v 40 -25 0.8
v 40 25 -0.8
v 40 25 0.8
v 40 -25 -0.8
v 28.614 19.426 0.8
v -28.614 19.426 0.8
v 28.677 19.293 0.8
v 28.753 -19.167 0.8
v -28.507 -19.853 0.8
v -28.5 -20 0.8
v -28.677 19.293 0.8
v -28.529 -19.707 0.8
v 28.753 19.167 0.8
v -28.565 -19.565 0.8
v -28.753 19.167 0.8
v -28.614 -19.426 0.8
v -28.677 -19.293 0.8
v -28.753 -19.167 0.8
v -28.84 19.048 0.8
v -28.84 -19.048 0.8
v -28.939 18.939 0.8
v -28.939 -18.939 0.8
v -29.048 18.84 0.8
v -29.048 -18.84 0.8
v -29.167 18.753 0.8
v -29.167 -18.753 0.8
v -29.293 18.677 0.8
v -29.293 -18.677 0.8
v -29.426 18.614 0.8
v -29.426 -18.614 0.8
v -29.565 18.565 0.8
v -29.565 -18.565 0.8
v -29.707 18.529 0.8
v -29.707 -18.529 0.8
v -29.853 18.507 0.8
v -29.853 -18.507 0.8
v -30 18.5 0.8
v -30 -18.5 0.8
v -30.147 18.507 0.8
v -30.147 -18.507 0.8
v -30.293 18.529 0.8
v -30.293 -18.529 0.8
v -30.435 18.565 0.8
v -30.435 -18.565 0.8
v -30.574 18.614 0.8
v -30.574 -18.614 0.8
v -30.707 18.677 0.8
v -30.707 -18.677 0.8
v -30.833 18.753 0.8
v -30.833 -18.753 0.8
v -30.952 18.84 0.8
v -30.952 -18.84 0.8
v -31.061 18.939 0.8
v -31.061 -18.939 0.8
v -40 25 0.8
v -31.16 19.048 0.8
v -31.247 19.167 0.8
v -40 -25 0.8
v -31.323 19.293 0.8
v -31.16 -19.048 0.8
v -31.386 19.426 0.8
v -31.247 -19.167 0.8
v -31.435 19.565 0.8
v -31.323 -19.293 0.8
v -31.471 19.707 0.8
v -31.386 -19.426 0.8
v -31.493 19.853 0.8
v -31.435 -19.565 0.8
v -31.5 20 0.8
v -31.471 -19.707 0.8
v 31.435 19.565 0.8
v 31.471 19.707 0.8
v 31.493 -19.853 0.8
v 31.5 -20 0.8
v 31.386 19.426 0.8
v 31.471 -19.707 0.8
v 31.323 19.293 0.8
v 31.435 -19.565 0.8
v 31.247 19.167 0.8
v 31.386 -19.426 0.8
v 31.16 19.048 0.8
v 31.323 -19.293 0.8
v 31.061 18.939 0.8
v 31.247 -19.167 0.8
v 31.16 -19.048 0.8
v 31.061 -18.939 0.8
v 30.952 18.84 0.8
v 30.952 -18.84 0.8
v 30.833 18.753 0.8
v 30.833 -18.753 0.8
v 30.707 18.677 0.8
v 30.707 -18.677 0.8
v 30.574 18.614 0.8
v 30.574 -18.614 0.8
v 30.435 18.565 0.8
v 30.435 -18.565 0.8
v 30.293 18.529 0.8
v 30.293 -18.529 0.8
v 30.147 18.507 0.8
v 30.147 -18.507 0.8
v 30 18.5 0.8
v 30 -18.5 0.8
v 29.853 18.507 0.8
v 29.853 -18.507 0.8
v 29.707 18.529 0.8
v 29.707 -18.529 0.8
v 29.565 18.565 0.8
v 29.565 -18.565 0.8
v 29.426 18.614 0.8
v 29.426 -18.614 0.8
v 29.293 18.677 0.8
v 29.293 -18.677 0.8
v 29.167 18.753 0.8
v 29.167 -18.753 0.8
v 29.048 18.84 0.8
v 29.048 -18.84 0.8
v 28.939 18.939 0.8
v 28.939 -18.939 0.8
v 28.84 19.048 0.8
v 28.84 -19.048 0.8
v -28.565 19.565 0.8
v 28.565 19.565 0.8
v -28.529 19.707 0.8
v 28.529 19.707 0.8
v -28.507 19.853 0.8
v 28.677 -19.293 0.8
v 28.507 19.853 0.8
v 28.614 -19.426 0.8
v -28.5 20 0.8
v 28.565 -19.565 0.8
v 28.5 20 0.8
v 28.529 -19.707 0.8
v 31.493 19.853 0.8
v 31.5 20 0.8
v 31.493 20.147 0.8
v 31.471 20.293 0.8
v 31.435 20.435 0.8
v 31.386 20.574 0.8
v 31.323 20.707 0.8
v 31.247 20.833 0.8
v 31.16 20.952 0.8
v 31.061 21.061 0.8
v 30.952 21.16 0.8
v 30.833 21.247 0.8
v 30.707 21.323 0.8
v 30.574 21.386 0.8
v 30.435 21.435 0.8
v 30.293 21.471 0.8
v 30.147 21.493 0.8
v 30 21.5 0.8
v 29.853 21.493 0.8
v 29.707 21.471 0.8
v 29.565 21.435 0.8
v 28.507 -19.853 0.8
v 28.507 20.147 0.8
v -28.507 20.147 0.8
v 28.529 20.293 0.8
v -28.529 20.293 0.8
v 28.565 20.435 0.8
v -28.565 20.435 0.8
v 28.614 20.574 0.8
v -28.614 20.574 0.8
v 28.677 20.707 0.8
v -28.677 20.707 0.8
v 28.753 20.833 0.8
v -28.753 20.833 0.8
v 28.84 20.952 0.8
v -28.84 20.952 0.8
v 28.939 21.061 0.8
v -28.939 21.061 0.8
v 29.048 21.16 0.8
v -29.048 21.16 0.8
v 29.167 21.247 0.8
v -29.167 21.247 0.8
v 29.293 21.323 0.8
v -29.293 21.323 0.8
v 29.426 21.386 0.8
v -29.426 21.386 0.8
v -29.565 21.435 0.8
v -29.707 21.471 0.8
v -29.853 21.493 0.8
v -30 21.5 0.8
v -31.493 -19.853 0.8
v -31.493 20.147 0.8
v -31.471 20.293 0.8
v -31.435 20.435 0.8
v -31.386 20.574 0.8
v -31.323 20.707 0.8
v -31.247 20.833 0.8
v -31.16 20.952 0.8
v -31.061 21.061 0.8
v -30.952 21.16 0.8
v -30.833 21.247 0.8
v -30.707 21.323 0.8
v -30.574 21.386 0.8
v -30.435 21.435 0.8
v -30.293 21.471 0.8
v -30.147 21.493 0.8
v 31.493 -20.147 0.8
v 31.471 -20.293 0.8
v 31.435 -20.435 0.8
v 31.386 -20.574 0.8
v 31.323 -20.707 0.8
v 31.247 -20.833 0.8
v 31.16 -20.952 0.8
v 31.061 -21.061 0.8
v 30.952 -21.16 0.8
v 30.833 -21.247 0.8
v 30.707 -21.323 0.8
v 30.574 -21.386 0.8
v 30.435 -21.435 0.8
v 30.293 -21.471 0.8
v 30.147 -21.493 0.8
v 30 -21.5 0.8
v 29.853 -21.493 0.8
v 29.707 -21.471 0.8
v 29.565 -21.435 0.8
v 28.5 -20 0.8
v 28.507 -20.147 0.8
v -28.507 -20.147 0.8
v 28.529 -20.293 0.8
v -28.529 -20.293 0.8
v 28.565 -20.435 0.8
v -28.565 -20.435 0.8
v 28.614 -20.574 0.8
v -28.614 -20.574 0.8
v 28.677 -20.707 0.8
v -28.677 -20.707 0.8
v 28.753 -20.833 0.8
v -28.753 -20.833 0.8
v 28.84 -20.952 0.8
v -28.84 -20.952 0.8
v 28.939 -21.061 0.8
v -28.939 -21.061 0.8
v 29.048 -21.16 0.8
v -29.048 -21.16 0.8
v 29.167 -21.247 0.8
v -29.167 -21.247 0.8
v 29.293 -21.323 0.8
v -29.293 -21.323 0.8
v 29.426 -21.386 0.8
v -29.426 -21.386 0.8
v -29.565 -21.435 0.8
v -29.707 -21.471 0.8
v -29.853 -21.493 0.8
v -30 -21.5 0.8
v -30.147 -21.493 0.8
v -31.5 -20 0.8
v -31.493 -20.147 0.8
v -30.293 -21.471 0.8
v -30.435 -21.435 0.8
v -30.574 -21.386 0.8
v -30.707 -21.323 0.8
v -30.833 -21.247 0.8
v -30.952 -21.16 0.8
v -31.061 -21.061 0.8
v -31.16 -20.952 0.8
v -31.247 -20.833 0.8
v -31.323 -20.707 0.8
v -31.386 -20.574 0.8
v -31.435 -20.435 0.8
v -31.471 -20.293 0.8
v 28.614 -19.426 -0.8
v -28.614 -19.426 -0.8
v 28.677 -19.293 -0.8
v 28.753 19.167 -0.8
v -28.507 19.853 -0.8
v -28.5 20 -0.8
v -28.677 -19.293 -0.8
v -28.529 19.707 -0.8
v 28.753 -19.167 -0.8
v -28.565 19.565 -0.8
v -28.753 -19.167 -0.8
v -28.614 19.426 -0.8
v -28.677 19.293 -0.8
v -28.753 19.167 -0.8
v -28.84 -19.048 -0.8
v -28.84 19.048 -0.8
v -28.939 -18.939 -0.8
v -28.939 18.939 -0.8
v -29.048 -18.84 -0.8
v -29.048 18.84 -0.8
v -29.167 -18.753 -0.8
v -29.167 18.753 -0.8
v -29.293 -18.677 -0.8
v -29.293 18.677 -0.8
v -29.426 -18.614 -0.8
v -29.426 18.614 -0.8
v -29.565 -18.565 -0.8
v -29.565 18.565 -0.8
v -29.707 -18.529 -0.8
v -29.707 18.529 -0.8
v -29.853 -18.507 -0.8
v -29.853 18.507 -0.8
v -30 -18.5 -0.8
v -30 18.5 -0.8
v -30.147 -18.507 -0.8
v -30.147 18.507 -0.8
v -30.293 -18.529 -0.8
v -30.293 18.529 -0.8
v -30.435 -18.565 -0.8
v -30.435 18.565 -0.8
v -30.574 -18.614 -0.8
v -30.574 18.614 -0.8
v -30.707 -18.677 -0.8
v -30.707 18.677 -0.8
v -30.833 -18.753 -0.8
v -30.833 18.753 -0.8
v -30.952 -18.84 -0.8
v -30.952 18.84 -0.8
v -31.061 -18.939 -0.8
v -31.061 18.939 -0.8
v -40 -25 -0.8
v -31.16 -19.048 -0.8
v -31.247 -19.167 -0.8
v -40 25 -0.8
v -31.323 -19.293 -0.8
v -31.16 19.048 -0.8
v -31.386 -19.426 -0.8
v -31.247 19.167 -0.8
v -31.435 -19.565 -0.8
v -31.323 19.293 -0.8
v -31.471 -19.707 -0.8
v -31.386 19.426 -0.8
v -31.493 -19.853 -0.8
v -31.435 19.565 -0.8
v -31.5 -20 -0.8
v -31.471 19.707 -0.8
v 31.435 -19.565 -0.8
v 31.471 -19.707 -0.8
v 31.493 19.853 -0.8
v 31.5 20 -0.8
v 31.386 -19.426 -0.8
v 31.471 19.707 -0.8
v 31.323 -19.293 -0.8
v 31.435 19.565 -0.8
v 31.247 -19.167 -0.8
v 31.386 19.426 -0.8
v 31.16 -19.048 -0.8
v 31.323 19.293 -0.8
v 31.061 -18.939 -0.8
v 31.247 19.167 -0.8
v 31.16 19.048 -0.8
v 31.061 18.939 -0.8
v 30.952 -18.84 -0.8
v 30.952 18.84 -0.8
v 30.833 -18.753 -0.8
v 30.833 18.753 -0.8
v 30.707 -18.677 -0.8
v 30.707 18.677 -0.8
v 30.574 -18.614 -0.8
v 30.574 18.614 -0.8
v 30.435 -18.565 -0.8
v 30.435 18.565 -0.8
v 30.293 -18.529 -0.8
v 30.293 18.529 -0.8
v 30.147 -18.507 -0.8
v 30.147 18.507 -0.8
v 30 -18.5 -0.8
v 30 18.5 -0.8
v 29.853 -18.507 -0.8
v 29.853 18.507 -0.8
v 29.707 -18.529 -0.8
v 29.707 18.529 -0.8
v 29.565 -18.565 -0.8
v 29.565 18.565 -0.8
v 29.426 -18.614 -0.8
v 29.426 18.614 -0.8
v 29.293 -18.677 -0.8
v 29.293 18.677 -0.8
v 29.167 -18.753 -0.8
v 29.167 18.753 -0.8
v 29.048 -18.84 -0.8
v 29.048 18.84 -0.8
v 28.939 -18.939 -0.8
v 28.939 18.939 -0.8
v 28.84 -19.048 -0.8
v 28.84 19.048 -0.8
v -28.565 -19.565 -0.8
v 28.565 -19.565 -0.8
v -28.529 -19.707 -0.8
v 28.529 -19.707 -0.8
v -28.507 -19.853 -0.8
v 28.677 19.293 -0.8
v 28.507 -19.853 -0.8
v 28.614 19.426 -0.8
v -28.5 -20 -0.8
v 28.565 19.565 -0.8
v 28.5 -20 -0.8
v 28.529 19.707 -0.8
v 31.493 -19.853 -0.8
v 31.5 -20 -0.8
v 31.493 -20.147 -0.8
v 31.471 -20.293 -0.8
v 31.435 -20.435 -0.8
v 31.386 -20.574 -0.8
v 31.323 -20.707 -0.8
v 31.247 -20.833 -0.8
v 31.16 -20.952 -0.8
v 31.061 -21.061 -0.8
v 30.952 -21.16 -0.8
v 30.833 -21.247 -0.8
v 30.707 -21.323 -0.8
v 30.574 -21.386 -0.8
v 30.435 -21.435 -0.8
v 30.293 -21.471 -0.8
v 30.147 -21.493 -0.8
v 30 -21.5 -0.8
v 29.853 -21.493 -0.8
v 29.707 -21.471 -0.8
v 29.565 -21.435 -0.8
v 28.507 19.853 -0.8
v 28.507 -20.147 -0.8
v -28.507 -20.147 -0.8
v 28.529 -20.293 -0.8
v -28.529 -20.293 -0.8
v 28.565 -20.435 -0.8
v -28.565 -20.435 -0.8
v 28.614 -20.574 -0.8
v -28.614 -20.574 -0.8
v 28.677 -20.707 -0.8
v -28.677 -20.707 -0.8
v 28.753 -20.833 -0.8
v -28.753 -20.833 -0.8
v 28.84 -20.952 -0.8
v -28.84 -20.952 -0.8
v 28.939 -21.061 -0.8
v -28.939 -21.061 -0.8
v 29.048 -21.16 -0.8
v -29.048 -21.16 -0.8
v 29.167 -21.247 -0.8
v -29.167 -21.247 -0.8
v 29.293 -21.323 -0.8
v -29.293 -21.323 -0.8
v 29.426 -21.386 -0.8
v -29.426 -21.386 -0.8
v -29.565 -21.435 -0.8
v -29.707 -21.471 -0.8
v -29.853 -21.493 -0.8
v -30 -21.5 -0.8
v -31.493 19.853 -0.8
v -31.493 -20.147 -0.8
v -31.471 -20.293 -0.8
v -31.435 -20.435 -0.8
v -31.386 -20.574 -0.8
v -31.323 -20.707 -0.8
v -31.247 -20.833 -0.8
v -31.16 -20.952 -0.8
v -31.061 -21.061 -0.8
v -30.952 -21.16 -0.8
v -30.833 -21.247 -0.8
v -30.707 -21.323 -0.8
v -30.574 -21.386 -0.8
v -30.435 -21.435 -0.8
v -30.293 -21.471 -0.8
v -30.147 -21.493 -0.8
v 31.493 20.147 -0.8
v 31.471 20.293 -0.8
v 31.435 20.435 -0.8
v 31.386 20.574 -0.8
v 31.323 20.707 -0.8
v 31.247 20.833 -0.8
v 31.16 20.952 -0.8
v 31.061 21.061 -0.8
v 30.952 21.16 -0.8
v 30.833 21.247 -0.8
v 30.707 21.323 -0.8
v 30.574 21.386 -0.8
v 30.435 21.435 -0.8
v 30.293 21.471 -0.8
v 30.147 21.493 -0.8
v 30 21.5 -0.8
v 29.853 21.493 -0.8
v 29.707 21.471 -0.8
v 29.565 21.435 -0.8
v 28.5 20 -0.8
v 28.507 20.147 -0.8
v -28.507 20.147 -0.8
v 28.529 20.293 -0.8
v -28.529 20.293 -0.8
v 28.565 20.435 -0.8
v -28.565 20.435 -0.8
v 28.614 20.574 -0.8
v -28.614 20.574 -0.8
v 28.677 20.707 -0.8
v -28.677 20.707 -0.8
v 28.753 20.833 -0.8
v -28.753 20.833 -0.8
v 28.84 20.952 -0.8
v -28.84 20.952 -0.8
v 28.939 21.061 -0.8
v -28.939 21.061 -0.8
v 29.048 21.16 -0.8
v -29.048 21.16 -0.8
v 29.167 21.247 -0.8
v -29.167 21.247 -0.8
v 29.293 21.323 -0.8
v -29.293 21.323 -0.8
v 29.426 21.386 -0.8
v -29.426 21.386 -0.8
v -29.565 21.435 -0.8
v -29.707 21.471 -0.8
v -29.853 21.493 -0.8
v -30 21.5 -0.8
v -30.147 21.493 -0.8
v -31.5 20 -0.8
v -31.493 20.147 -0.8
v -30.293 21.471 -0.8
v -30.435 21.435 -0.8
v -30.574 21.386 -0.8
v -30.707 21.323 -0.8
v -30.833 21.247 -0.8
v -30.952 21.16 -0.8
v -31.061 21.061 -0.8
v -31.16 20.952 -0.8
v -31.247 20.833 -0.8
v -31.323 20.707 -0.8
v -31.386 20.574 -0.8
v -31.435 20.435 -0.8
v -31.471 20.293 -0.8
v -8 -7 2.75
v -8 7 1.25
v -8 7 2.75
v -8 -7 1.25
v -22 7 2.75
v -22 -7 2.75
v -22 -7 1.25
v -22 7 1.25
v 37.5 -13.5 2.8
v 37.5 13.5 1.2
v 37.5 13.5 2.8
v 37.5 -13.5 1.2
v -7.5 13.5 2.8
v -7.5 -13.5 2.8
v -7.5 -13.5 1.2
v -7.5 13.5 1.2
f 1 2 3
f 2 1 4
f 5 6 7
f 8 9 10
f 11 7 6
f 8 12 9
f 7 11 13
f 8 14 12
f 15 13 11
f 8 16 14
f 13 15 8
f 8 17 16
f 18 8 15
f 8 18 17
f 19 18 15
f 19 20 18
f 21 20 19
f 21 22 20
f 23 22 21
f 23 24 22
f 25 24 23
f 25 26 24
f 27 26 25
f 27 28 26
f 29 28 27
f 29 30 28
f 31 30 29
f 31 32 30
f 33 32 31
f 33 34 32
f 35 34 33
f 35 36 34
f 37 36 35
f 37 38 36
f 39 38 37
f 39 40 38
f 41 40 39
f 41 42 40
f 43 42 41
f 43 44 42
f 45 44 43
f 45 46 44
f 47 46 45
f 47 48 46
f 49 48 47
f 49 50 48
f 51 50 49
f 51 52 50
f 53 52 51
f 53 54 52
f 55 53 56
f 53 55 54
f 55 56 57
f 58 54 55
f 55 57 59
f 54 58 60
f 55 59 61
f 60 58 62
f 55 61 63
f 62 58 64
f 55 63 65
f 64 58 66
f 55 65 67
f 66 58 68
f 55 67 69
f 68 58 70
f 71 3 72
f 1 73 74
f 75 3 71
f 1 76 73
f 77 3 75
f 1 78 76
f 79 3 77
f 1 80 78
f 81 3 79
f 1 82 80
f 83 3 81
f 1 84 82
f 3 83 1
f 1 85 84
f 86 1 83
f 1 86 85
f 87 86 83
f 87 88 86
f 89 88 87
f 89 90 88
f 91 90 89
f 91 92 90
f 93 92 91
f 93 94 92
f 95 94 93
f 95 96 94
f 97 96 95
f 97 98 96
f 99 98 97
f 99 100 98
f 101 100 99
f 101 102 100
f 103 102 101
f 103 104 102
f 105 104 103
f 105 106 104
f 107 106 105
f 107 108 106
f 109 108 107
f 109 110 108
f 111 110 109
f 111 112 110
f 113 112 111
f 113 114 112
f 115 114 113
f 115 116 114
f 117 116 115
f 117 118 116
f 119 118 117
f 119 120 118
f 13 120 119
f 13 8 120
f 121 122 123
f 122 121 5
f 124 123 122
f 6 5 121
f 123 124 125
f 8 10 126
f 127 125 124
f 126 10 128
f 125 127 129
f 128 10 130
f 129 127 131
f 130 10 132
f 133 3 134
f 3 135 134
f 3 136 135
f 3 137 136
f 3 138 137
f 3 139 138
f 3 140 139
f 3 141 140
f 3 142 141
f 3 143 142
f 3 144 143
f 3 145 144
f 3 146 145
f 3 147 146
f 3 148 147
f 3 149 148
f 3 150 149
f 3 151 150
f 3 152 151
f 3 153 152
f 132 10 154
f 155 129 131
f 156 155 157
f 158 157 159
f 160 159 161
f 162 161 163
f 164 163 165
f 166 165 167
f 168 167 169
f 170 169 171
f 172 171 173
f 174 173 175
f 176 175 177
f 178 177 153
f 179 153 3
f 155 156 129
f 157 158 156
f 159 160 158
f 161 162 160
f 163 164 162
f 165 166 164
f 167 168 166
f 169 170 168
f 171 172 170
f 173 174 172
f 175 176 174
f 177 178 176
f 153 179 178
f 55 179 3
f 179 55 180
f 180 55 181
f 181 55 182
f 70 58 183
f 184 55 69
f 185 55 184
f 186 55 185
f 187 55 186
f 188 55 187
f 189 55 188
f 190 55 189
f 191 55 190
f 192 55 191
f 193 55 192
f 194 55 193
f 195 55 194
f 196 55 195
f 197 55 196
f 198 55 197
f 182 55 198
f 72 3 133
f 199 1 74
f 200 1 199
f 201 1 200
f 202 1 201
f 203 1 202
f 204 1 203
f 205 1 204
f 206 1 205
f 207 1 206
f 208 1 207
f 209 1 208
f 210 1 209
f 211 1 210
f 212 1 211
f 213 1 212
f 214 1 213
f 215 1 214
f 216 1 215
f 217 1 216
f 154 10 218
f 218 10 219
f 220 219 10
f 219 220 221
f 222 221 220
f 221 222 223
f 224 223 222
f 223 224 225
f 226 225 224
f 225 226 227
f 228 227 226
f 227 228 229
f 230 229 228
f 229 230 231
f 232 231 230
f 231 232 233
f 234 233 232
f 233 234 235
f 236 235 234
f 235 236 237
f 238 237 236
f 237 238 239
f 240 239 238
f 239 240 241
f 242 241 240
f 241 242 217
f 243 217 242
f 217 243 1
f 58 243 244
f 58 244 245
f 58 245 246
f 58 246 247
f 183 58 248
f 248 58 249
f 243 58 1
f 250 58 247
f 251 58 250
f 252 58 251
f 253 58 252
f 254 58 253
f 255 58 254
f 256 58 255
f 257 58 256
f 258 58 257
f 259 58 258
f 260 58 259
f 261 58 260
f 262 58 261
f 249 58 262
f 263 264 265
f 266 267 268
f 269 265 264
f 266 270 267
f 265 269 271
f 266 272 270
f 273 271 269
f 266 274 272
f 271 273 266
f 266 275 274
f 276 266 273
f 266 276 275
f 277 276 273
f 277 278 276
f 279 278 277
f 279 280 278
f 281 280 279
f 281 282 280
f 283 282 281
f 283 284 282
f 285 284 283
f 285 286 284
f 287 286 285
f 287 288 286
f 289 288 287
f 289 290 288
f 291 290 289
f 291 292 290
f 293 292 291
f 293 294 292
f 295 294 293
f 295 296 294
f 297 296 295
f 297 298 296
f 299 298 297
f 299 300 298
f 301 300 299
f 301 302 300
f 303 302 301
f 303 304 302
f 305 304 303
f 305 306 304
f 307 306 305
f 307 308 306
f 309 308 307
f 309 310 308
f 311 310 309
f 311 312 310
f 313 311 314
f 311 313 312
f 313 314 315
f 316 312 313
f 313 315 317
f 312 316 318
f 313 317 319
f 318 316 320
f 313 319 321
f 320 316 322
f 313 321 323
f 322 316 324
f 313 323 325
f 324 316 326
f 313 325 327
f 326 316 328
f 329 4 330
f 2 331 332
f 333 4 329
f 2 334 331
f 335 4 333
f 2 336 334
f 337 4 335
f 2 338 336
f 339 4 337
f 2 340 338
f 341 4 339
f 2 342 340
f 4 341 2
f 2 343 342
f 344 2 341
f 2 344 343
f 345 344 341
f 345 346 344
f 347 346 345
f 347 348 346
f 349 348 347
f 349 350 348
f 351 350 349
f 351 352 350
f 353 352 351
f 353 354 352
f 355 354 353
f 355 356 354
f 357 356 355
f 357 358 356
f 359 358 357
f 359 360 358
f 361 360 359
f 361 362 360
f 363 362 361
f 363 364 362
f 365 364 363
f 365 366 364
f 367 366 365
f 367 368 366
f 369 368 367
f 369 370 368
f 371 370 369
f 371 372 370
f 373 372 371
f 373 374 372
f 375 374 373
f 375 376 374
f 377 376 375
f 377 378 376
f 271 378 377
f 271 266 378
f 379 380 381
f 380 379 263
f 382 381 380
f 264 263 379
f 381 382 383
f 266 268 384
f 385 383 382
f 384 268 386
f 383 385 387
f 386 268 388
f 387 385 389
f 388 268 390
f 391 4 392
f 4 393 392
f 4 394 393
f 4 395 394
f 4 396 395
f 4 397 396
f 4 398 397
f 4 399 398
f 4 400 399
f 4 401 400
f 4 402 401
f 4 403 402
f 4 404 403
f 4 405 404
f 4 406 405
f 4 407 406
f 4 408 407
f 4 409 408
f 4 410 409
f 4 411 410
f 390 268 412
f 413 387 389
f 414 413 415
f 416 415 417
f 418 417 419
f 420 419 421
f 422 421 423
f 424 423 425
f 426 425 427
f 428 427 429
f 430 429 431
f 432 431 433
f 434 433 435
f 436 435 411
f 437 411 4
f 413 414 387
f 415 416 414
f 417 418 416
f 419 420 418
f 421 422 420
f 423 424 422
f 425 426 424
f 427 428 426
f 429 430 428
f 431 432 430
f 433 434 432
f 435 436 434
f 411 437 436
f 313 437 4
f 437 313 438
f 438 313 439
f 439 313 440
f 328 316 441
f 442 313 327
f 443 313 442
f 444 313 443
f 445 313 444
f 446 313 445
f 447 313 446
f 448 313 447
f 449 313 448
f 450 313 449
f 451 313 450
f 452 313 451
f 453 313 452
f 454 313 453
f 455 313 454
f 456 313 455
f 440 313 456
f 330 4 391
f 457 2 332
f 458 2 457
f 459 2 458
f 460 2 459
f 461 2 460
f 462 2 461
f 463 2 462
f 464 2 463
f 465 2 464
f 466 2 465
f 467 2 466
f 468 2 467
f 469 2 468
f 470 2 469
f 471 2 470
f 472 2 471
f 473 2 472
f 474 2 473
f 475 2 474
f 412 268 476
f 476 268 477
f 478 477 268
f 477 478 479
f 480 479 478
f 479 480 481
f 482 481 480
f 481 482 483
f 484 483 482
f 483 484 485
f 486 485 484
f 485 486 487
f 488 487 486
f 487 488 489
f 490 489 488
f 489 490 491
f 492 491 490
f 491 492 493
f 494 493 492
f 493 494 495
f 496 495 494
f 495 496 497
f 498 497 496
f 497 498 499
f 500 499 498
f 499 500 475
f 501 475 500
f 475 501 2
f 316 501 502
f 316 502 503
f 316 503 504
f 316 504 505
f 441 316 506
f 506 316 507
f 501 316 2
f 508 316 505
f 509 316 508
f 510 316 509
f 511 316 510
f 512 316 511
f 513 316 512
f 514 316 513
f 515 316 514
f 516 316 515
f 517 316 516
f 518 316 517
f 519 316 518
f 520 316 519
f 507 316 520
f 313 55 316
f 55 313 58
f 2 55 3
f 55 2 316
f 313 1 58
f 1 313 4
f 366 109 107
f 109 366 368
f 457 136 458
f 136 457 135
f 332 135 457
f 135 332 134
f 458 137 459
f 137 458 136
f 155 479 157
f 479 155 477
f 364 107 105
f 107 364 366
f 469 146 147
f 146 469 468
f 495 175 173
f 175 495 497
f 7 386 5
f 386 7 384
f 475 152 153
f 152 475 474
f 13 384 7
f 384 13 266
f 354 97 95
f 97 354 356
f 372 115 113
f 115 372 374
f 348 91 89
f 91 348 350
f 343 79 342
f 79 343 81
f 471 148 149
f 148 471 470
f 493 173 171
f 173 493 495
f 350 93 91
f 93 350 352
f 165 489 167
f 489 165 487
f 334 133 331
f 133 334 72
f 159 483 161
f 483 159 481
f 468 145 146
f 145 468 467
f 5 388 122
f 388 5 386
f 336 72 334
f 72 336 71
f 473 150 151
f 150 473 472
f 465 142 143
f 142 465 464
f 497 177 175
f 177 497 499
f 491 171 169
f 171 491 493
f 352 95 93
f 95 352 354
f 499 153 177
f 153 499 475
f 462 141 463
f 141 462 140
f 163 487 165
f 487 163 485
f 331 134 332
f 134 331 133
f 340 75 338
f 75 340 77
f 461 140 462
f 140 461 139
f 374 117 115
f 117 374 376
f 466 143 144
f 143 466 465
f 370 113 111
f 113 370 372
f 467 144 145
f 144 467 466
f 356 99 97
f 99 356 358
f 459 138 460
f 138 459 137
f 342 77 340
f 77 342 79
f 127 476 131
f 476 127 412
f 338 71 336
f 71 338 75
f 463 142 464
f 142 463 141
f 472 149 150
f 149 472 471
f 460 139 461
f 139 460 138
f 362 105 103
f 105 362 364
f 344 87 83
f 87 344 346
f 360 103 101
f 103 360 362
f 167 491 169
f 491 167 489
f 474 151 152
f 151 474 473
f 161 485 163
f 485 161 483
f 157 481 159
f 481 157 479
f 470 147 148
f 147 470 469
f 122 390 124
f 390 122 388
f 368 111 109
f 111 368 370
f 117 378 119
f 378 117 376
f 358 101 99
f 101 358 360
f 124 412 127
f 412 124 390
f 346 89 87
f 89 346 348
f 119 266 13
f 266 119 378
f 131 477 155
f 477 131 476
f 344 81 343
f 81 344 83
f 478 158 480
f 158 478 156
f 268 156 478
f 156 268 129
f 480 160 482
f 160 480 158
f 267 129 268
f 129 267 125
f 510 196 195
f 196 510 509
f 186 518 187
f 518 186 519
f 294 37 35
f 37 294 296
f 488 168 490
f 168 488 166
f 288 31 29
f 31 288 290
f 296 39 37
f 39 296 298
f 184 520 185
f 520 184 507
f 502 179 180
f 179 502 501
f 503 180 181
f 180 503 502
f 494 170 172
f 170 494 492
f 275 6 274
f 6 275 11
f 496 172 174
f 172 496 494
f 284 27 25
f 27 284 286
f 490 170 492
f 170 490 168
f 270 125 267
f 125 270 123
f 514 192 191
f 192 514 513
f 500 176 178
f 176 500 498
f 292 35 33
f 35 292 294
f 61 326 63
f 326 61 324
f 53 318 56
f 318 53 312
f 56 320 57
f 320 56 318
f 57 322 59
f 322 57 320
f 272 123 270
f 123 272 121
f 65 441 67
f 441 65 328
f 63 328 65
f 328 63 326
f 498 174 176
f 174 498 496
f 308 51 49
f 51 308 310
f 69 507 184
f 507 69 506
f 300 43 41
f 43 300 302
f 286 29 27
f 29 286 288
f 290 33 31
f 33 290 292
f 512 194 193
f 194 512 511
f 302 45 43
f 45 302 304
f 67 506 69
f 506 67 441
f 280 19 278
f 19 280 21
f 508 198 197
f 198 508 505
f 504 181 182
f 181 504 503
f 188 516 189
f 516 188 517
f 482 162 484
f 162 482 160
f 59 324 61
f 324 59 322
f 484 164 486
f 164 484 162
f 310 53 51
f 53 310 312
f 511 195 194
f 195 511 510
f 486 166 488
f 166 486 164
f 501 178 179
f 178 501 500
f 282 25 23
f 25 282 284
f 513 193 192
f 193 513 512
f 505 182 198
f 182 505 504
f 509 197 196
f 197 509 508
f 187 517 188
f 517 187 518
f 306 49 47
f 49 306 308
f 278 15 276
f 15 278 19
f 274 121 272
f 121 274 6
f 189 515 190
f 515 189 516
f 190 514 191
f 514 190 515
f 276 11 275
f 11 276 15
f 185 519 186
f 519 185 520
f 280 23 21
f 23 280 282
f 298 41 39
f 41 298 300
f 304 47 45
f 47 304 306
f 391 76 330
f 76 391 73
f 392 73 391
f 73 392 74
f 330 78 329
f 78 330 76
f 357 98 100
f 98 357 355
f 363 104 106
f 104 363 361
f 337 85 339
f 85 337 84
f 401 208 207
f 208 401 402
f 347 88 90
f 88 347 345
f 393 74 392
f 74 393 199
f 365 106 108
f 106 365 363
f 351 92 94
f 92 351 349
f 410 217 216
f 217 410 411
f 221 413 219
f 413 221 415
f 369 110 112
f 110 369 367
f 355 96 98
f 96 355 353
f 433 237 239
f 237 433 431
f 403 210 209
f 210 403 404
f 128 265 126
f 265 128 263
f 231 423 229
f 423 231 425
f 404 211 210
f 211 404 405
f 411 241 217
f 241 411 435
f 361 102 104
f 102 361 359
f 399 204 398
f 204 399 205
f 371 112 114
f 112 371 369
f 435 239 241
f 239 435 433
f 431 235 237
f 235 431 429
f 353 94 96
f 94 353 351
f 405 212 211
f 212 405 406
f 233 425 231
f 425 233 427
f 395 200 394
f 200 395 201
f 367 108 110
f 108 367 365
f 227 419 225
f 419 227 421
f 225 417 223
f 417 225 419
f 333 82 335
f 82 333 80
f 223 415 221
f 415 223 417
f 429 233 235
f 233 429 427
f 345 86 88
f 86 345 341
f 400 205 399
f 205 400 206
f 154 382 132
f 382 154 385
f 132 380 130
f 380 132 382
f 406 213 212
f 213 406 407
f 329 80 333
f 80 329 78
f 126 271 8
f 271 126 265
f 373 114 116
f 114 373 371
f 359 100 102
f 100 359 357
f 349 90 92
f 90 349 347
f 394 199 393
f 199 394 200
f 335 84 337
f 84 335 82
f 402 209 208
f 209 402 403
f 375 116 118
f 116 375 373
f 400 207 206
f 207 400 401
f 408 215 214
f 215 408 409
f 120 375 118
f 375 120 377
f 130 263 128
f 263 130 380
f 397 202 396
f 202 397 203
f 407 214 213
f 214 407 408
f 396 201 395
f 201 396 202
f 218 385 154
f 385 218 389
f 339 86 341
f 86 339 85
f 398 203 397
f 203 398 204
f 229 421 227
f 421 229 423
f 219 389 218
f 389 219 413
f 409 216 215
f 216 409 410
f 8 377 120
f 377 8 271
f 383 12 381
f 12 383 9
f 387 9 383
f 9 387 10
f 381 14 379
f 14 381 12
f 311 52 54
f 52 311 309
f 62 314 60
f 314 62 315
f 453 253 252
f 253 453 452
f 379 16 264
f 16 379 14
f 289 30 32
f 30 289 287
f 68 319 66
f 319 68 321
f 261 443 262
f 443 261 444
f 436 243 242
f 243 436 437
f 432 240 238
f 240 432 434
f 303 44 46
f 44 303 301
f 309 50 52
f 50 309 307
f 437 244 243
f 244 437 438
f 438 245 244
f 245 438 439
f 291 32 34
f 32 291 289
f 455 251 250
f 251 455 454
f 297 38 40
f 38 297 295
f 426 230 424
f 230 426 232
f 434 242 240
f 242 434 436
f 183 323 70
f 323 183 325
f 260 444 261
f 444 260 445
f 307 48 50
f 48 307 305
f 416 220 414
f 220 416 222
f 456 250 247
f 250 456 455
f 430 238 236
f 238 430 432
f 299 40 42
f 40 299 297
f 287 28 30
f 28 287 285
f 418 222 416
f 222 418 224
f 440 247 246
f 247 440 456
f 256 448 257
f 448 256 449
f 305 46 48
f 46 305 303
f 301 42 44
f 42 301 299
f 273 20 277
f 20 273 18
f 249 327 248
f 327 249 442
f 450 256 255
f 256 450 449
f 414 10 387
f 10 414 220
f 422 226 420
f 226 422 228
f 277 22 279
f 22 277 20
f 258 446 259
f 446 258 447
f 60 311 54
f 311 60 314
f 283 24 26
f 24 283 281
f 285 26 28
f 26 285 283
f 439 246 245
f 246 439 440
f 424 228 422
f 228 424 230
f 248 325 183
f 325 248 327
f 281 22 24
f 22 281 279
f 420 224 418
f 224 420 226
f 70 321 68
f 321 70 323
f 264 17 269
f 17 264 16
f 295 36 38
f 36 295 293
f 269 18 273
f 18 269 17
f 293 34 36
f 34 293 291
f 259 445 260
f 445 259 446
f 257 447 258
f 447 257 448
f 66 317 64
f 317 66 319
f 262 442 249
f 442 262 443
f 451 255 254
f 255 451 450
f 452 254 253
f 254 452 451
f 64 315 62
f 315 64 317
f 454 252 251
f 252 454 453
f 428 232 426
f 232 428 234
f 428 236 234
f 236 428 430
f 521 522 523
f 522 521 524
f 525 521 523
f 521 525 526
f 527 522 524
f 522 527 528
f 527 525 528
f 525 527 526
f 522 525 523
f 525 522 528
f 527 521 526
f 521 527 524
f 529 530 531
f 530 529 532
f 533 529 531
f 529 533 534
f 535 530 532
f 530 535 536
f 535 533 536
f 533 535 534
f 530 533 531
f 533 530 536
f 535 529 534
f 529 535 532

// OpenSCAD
// АвтоПилот-5 — Контроллер
$fn = 64;
module pcb() {
    color([0.1,0.5,0.1])
    difference() {
        cube([80,50,1.6], center=true);
        translate([30,20,0]) cylinder(d=3, h=3, center=true);
        translate([-30,20,0]) cylinder(d=3, h=3, center=true);
        translate([30,-20,0]) cylinder(d=3, h=3, center=true);
        translate([-30,-20,0]) cylinder(d=3, h=3, center=true);
    }
}
module stm32() { color([0.2,0.2,0.2]) cube([14,14,1.5], center=true); }
module jetson() { color([0.1,0.5,0.1]) cube([45,27,1.6], center=true); }
module assembly() {
    pcb();
    translate([-15,0,2]) stm32();
    translate([15,0,2]) jetson();
}
assembly();
